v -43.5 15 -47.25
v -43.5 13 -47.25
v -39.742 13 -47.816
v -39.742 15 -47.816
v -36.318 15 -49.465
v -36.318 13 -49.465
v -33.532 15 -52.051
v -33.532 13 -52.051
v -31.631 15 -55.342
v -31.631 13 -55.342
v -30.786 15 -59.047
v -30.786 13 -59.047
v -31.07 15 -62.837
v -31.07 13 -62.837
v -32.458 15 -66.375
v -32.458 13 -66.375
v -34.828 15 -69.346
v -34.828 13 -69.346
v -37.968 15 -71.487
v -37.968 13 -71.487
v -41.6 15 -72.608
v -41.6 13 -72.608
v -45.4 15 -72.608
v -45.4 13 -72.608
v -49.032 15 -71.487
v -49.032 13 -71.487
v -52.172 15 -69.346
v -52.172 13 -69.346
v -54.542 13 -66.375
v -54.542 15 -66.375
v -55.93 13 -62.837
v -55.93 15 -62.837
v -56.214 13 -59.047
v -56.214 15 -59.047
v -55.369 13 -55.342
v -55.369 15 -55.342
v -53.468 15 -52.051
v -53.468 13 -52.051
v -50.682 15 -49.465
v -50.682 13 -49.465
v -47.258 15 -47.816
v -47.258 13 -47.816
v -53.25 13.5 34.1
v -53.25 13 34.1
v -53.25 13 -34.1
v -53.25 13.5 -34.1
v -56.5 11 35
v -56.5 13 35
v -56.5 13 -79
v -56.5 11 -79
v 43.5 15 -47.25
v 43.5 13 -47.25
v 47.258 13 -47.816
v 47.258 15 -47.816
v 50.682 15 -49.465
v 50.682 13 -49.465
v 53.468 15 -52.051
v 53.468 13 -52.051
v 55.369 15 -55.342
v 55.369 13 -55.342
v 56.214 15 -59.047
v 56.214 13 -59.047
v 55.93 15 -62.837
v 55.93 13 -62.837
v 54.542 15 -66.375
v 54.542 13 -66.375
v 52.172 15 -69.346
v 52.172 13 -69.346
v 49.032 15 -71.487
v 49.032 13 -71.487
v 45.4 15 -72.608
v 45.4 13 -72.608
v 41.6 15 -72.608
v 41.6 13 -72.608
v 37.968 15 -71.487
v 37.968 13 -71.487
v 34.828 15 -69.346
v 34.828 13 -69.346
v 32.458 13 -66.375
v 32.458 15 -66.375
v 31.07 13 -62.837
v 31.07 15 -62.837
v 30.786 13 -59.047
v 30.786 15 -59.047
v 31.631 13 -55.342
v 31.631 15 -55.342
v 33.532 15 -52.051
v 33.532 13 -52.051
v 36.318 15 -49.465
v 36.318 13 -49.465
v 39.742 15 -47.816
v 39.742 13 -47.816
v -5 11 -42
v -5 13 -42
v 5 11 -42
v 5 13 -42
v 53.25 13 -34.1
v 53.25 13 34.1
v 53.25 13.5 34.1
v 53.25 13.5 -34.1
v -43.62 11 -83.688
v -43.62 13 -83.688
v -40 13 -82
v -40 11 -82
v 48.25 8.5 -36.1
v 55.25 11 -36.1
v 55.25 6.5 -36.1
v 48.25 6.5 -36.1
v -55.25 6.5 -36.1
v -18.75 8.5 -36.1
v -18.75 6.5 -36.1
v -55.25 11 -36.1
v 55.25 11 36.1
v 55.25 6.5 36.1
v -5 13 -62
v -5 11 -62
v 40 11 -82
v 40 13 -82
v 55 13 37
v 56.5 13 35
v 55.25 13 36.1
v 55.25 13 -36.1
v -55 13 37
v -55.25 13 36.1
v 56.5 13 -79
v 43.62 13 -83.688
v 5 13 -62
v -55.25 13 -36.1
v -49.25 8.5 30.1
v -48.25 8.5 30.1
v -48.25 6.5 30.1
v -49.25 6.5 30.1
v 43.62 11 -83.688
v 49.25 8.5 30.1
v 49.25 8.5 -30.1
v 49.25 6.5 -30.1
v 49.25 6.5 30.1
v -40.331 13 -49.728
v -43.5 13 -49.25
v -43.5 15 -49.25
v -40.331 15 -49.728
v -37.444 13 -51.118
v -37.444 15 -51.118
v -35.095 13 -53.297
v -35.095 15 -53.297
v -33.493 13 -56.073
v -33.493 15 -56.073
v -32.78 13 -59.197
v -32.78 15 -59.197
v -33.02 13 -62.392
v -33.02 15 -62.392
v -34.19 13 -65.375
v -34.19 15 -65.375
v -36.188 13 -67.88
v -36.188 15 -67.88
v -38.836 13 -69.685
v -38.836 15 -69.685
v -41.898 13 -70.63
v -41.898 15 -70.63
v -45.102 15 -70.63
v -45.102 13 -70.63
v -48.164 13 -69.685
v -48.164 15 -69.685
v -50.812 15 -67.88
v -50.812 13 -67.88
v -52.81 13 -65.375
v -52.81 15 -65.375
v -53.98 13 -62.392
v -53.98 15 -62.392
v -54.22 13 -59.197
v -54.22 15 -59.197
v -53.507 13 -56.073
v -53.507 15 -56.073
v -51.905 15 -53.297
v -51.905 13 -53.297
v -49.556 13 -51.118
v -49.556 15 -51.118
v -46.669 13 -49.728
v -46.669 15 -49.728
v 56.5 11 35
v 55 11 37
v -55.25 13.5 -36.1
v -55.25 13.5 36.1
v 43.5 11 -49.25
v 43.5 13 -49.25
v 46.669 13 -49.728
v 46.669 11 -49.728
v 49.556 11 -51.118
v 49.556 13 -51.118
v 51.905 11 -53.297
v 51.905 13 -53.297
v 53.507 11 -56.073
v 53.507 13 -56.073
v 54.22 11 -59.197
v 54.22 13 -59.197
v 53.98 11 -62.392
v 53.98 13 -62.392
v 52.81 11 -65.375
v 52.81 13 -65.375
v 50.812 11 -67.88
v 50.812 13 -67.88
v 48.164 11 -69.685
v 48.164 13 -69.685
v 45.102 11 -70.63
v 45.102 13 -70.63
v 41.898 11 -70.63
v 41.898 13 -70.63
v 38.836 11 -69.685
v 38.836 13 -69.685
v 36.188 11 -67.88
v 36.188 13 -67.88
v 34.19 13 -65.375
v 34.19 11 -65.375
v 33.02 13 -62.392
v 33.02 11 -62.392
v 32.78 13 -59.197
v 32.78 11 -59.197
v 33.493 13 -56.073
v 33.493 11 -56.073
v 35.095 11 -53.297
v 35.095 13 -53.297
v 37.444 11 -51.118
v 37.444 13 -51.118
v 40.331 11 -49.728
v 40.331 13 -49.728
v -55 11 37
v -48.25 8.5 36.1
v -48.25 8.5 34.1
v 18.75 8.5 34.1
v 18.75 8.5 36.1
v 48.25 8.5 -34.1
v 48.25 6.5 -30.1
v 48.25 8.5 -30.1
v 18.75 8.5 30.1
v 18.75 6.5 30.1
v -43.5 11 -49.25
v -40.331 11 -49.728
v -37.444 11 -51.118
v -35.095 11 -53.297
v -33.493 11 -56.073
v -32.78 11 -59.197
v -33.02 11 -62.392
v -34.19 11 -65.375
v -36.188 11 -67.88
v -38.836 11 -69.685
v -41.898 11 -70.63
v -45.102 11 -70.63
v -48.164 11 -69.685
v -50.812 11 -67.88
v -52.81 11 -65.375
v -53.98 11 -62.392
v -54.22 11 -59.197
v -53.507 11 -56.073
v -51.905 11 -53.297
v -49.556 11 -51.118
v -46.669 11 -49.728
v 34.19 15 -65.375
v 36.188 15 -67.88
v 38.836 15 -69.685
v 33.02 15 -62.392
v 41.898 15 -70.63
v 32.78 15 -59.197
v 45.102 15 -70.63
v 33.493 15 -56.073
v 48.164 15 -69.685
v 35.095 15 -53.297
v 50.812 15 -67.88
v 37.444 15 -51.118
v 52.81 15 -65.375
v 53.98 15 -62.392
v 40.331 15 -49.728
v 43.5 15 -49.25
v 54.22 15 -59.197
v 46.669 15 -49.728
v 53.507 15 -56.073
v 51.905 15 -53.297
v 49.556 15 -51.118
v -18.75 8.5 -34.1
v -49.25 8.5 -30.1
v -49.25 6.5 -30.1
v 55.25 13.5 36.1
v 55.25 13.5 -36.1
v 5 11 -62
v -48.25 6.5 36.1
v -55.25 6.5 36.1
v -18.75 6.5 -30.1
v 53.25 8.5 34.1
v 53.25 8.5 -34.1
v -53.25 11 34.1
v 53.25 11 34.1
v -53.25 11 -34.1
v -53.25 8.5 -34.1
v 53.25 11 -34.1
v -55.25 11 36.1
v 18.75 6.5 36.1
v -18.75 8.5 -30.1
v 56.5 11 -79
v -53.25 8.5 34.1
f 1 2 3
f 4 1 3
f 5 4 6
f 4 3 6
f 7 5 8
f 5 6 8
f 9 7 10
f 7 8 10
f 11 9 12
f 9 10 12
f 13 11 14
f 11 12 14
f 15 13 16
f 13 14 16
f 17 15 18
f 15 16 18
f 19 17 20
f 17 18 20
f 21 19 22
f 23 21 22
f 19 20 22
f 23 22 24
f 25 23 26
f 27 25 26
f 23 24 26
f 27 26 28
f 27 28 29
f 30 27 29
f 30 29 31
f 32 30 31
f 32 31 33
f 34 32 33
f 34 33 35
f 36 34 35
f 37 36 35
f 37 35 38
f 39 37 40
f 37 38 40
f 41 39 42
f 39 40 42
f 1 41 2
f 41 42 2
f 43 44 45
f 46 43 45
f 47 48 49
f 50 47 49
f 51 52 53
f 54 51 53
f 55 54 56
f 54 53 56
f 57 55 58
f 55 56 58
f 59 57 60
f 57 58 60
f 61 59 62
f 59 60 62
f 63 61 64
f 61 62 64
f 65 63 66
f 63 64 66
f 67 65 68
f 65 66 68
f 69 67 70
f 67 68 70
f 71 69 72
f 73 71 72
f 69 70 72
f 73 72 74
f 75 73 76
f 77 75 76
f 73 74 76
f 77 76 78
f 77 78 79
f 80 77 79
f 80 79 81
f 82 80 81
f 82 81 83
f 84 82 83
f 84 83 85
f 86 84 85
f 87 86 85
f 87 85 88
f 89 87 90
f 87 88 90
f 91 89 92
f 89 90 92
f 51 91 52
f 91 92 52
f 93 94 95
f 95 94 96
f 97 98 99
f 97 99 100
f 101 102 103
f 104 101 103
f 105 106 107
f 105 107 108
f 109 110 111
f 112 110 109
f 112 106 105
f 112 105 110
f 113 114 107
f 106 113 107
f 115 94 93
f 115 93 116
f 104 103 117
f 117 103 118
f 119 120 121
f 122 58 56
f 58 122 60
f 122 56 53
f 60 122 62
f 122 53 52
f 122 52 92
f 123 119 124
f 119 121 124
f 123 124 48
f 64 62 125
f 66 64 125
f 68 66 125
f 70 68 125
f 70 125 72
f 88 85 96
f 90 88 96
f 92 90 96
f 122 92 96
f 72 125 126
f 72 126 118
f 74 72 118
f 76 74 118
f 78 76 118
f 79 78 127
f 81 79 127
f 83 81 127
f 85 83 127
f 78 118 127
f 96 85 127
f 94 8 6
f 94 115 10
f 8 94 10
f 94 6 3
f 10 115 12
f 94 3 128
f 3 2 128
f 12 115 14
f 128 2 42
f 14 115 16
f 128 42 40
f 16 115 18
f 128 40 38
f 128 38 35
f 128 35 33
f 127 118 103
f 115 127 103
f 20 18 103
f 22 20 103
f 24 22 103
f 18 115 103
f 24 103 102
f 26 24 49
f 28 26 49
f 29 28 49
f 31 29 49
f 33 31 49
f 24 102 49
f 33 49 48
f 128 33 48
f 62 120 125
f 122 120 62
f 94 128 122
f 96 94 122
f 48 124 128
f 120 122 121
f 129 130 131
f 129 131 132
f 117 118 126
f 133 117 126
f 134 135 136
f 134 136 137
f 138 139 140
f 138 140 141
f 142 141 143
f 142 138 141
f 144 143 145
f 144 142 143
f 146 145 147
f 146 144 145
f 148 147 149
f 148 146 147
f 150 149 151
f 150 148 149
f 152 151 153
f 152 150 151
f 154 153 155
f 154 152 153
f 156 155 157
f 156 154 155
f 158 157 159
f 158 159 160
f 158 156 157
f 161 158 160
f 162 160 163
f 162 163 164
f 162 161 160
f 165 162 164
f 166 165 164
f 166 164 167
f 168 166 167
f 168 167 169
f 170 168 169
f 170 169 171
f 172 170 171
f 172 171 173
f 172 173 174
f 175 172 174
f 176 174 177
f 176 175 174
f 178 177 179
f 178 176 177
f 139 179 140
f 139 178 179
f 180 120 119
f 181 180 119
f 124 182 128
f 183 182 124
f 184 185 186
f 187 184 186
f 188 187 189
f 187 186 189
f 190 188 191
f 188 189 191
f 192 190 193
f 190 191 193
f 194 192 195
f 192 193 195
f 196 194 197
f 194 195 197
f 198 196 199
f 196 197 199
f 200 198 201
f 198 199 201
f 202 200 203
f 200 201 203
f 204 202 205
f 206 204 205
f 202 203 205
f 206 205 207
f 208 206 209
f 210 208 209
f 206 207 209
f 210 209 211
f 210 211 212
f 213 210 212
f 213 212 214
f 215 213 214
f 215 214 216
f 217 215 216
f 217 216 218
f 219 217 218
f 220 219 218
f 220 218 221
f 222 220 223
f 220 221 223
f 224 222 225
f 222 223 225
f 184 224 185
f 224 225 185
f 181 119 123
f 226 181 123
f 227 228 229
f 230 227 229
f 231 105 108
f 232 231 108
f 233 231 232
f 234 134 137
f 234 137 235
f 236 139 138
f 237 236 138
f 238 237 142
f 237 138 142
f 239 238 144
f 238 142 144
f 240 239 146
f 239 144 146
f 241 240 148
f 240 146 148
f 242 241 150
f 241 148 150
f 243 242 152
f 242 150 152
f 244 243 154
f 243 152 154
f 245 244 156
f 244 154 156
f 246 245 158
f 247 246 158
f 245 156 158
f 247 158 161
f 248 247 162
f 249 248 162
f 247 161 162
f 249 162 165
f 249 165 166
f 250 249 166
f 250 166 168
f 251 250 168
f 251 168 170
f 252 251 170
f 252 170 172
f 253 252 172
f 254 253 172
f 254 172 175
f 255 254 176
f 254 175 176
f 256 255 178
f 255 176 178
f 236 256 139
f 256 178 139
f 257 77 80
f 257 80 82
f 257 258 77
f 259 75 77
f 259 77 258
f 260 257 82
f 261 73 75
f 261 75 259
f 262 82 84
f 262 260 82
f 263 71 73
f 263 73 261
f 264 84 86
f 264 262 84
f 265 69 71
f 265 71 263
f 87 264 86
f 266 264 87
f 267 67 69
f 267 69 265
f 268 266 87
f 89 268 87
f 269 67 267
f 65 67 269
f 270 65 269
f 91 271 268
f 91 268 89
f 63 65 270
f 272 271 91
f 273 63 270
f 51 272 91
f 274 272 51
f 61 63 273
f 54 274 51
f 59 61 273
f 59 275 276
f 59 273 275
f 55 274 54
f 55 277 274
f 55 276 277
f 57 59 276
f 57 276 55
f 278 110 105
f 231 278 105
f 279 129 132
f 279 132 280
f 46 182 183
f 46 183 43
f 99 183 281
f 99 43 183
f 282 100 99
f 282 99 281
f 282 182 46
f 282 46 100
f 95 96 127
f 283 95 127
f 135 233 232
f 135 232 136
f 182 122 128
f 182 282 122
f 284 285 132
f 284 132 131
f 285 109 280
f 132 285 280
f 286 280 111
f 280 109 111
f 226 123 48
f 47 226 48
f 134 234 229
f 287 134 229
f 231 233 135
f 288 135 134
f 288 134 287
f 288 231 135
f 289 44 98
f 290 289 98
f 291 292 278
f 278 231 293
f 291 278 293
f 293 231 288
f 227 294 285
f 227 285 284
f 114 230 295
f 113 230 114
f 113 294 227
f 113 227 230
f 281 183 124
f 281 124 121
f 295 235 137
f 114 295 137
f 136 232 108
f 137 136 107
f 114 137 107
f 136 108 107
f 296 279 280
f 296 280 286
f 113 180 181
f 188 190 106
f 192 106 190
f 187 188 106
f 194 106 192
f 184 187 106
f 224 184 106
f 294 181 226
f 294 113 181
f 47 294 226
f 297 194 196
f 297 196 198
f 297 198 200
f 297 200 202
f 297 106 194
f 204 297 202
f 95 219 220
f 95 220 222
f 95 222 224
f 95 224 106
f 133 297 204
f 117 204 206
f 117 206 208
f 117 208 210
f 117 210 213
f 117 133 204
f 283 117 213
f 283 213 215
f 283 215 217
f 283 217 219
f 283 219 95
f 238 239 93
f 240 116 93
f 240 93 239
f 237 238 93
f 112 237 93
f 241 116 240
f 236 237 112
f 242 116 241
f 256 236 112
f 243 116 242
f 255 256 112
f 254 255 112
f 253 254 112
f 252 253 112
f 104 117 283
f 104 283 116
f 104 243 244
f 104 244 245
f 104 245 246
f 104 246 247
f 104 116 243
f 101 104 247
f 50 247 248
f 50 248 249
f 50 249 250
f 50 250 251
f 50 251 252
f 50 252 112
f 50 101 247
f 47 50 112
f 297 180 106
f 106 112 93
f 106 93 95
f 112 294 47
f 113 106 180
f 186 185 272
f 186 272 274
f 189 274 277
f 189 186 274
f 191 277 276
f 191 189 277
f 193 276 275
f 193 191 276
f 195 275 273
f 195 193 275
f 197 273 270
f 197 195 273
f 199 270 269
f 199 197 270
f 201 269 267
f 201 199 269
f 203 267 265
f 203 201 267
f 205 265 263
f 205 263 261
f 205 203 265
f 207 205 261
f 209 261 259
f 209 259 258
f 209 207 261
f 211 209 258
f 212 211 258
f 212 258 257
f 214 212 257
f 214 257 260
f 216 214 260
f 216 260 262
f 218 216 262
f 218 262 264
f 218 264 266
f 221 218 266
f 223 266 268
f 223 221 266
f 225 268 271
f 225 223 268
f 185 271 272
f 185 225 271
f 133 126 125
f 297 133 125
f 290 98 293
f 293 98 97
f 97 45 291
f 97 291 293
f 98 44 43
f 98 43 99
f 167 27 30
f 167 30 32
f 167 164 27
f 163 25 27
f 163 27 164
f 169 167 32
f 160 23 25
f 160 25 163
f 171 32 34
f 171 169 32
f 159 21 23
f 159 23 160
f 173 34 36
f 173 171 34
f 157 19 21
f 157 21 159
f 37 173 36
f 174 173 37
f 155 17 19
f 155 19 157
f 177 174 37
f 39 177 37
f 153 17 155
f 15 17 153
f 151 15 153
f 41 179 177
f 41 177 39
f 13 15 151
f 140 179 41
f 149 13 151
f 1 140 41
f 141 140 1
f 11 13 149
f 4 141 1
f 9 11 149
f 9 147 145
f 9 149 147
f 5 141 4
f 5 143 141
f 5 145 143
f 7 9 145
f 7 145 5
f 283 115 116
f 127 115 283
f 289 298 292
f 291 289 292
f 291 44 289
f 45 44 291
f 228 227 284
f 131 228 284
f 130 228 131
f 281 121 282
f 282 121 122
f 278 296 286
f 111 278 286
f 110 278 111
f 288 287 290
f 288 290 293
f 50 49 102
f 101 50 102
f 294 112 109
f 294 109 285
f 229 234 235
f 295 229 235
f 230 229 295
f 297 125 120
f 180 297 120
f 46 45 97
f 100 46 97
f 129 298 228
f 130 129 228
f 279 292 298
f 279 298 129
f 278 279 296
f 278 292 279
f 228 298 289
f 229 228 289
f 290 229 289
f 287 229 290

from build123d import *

# Parameters (mm, degrees)
SKETCH1_W             = 110.5
SKETCH1_H             = 72.2
SKETCH1_W_2           = 106.5
SKETCH1_H_2           = 68.2
BOSS_EXTRUDE1_DEPTH   = 5
BOSS_EXTRUDE2_DEPTH   = 2
SKETCH4_R             = 12.75
SKETCH4_R_2           = 10.75
BOSS_EXTRUDE3_DEPTH   = 2
BOSS_EXTRUDE3_2_DEPTH = 2
SKETCH5_R             = 10.75
SKETCH5_W             = 106.5
SKETCH5_H             = 68.2
SKETCH5_W_2           = 10
SKETCH5_H_2           = 20
BOSS_EXTRUDE4_DEPTH   = 2


with BuildPart() as part:
    # Sketch1 → Boss-Extrude1 (new body)
    with BuildSketch(Plane(origin=(0, 8.5, 0), x_dir=(1, 0, 0), z_dir=(0, 1, 0))):
        Rectangle(SKETCH1_W, SKETCH1_H)
        Rectangle(SKETCH1_W_2, SKETCH1_H_2, mode=Mode.SUBTRACT)
    extrude(amount=BOSS_EXTRUDE1_DEPTH)

    # Sketch2 → Boss-Extrude2 (add)
    with BuildSketch(Plane(origin=(0, 8.5, 0), x_dir=(1, 0, 0), z_dir=(0, 1, 0))):
        Polygon((-55.25, 36.1), (-55.25, -36.1), (-48.25, -36.1), (-48.25, -30.1), (-49.25, -30.1), (-49.25, 30.1), (-18.75, 30.1), (-18.75, 36.1), align=None)
        Polygon((55.25, -36.1), (55.25, 36.1), (48.25, 36.1), (48.25, 30.1), (49.25, 30.1), (49.25, -30.1), (18.75, -30.1), (18.75, -36.1), align=None)
    extrude(amount=-BOSS_EXTRUDE2_DEPTH)



with BuildPart() as body_2:
    # Sketch4 → Boss-Extrude3 (new body)
    with BuildSketch(Plane(origin=(0, 13, 0), x_dir=(1, 0, 0), z_dir=(0, 1, 0))):
        with Locations((-43.5, 60)):
            Circle(SKETCH4_R)
        with Locations((-43.5, 60)):
            Circle(SKETCH4_R_2, mode=Mode.SUBTRACT)
    extrude(amount=BOSS_EXTRUDE3_DEPTH)


with BuildPart() as body_3:
    # Sketch4 → Boss-Extrude3 2 (new body)
    with BuildSketch(Plane(origin=(0, 13, 0), x_dir=(1, 0, 0), z_dir=(0, 1, 0))):
        with Locations((43.5, 60)):
            Circle(SKETCH4_R)
        with Locations((43.5, 60)):
            Circle(SKETCH4_R_2, mode=Mode.SUBTRACT)
    extrude(amount=BOSS_EXTRUDE3_2_DEPTH)


with BuildPart() as part_1:
    add(part.part)

    add(body_2.part)  # Boss-Extrude4 merges body 2

    add(body_3.part)  # Boss-Extrude4 merges body 3
    # Sketch5 → Boss-Extrude4 (add)
    with BuildSketch(Plane(origin=(0, 13, 0), x_dir=(1, 0, 0), z_dir=(0, 1, 0))):
        Polygon((-56.5, -35), (-56.5, 79), (-43.619883045, 83.687979185), (-40, 82), (40, 82), (43.619883045, 83.687979185), (56.5, 79), (56.5, -35), (55, -37), (-55, -37), align=None)
        with Locations((-43.5, 60)):
            Circle(SKETCH5_R, mode=Mode.SUBTRACT)
        with Locations((43.5, 60)):
            Circle(SKETCH5_R, mode=Mode.SUBTRACT)
        Rectangle(SKETCH5_W, SKETCH5_H, mode=Mode.SUBTRACT)
        with Locations((0, 52)):
            Rectangle(SKETCH5_W_2, SKETCH5_H_2, mode=Mode.SUBTRACT)
    extrude(amount=-BOSS_EXTRUDE4_DEPTH)


solid = part_1.part
